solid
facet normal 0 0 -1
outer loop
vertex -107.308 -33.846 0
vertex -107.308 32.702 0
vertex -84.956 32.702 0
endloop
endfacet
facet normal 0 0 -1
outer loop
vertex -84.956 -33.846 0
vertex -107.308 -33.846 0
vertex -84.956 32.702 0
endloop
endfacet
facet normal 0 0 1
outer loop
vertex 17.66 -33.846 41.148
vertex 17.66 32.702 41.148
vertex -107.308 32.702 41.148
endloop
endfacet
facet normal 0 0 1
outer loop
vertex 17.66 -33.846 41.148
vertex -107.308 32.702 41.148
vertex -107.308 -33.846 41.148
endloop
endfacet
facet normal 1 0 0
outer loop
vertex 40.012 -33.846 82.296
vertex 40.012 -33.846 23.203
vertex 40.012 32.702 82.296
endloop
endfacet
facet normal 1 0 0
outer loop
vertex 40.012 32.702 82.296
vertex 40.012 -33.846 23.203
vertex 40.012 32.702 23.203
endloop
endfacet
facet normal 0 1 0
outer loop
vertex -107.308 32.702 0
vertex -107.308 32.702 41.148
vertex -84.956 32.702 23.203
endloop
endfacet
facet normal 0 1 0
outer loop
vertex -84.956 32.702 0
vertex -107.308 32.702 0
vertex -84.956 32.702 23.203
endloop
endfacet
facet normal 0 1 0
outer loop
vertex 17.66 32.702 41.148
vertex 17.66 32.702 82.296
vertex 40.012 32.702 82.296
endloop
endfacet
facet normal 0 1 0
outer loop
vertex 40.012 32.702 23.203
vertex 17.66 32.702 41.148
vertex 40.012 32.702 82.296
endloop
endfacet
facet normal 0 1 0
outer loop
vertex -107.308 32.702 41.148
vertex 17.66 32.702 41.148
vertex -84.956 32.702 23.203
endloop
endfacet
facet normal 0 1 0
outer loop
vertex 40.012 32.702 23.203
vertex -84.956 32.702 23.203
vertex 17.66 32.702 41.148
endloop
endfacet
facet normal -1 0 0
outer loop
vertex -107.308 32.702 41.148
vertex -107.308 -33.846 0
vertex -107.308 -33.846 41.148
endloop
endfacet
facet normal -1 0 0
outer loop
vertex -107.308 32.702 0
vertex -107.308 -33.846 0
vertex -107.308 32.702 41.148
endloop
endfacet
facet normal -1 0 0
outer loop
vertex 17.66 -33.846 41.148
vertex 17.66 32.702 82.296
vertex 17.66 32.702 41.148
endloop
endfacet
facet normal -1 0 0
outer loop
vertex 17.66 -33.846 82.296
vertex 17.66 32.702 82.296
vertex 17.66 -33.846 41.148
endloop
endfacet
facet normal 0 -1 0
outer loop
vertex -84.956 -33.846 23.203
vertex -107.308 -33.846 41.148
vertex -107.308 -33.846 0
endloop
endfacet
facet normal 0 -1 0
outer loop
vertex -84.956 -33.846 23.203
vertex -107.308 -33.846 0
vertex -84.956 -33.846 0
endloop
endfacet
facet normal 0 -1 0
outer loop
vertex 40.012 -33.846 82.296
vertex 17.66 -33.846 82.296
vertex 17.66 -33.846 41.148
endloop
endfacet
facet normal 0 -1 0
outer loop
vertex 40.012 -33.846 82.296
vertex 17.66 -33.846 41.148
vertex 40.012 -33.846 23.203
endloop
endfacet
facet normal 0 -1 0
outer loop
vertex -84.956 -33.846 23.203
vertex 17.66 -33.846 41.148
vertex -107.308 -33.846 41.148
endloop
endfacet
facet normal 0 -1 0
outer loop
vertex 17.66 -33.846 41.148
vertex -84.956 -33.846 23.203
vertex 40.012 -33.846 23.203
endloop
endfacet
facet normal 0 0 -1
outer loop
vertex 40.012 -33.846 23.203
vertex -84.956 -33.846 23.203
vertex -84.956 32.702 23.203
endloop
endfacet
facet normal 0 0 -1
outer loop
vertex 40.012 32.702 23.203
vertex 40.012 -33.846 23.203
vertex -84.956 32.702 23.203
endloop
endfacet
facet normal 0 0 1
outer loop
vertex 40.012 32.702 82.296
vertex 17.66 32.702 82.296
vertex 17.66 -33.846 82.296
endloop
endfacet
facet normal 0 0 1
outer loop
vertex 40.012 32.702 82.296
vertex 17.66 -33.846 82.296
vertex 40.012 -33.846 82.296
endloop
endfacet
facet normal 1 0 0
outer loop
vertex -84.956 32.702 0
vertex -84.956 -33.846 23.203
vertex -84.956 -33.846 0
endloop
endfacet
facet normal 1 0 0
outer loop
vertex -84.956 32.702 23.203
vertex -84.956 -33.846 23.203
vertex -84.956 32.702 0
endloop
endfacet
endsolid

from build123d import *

# Parameters (mm, degrees)
F0_W     = 147.32
F0_H     = 66.548
F1_DEPTH = 82.296
F2_W     = 66.548
F2_H     = 23.203082
F3_DEPTH = 124.968
F4_W     = 66.548
F4_H     = 41.148
F5_DEPTH = 124.968


with BuildPart() as f1:
    # F0 (on Top) → F1 (new body)
    with BuildSketch(Plane.XY):
        with Locations((-33.647868, -0.571987)):
            Rectangle(F0_W, F0_H)
    extrude(amount=F1_DEPTH)

    # F2 (on face) → F3 (cut)
    with BuildSketch(Plane.YZ.offset(40.012132)):
        with Locations((-0.571987, 11.601541)):
            Rectangle(F2_W, F2_H)
    extrude(amount=-F3_DEPTH, mode=Mode.SUBTRACT)

    # F4 (on face) → F5 (cut)
    with BuildSketch(Plane(origin=(-107.307868, 0, 0), x_dir=(0, -1, 0), z_dir=(-1, 0, 0))):
        with Locations((0.571987, 61.722)):
            Rectangle(F4_W, F4_H)
    extrude(amount=-F5_DEPTH, mode=Mode.SUBTRACT)


solid = f1.part
